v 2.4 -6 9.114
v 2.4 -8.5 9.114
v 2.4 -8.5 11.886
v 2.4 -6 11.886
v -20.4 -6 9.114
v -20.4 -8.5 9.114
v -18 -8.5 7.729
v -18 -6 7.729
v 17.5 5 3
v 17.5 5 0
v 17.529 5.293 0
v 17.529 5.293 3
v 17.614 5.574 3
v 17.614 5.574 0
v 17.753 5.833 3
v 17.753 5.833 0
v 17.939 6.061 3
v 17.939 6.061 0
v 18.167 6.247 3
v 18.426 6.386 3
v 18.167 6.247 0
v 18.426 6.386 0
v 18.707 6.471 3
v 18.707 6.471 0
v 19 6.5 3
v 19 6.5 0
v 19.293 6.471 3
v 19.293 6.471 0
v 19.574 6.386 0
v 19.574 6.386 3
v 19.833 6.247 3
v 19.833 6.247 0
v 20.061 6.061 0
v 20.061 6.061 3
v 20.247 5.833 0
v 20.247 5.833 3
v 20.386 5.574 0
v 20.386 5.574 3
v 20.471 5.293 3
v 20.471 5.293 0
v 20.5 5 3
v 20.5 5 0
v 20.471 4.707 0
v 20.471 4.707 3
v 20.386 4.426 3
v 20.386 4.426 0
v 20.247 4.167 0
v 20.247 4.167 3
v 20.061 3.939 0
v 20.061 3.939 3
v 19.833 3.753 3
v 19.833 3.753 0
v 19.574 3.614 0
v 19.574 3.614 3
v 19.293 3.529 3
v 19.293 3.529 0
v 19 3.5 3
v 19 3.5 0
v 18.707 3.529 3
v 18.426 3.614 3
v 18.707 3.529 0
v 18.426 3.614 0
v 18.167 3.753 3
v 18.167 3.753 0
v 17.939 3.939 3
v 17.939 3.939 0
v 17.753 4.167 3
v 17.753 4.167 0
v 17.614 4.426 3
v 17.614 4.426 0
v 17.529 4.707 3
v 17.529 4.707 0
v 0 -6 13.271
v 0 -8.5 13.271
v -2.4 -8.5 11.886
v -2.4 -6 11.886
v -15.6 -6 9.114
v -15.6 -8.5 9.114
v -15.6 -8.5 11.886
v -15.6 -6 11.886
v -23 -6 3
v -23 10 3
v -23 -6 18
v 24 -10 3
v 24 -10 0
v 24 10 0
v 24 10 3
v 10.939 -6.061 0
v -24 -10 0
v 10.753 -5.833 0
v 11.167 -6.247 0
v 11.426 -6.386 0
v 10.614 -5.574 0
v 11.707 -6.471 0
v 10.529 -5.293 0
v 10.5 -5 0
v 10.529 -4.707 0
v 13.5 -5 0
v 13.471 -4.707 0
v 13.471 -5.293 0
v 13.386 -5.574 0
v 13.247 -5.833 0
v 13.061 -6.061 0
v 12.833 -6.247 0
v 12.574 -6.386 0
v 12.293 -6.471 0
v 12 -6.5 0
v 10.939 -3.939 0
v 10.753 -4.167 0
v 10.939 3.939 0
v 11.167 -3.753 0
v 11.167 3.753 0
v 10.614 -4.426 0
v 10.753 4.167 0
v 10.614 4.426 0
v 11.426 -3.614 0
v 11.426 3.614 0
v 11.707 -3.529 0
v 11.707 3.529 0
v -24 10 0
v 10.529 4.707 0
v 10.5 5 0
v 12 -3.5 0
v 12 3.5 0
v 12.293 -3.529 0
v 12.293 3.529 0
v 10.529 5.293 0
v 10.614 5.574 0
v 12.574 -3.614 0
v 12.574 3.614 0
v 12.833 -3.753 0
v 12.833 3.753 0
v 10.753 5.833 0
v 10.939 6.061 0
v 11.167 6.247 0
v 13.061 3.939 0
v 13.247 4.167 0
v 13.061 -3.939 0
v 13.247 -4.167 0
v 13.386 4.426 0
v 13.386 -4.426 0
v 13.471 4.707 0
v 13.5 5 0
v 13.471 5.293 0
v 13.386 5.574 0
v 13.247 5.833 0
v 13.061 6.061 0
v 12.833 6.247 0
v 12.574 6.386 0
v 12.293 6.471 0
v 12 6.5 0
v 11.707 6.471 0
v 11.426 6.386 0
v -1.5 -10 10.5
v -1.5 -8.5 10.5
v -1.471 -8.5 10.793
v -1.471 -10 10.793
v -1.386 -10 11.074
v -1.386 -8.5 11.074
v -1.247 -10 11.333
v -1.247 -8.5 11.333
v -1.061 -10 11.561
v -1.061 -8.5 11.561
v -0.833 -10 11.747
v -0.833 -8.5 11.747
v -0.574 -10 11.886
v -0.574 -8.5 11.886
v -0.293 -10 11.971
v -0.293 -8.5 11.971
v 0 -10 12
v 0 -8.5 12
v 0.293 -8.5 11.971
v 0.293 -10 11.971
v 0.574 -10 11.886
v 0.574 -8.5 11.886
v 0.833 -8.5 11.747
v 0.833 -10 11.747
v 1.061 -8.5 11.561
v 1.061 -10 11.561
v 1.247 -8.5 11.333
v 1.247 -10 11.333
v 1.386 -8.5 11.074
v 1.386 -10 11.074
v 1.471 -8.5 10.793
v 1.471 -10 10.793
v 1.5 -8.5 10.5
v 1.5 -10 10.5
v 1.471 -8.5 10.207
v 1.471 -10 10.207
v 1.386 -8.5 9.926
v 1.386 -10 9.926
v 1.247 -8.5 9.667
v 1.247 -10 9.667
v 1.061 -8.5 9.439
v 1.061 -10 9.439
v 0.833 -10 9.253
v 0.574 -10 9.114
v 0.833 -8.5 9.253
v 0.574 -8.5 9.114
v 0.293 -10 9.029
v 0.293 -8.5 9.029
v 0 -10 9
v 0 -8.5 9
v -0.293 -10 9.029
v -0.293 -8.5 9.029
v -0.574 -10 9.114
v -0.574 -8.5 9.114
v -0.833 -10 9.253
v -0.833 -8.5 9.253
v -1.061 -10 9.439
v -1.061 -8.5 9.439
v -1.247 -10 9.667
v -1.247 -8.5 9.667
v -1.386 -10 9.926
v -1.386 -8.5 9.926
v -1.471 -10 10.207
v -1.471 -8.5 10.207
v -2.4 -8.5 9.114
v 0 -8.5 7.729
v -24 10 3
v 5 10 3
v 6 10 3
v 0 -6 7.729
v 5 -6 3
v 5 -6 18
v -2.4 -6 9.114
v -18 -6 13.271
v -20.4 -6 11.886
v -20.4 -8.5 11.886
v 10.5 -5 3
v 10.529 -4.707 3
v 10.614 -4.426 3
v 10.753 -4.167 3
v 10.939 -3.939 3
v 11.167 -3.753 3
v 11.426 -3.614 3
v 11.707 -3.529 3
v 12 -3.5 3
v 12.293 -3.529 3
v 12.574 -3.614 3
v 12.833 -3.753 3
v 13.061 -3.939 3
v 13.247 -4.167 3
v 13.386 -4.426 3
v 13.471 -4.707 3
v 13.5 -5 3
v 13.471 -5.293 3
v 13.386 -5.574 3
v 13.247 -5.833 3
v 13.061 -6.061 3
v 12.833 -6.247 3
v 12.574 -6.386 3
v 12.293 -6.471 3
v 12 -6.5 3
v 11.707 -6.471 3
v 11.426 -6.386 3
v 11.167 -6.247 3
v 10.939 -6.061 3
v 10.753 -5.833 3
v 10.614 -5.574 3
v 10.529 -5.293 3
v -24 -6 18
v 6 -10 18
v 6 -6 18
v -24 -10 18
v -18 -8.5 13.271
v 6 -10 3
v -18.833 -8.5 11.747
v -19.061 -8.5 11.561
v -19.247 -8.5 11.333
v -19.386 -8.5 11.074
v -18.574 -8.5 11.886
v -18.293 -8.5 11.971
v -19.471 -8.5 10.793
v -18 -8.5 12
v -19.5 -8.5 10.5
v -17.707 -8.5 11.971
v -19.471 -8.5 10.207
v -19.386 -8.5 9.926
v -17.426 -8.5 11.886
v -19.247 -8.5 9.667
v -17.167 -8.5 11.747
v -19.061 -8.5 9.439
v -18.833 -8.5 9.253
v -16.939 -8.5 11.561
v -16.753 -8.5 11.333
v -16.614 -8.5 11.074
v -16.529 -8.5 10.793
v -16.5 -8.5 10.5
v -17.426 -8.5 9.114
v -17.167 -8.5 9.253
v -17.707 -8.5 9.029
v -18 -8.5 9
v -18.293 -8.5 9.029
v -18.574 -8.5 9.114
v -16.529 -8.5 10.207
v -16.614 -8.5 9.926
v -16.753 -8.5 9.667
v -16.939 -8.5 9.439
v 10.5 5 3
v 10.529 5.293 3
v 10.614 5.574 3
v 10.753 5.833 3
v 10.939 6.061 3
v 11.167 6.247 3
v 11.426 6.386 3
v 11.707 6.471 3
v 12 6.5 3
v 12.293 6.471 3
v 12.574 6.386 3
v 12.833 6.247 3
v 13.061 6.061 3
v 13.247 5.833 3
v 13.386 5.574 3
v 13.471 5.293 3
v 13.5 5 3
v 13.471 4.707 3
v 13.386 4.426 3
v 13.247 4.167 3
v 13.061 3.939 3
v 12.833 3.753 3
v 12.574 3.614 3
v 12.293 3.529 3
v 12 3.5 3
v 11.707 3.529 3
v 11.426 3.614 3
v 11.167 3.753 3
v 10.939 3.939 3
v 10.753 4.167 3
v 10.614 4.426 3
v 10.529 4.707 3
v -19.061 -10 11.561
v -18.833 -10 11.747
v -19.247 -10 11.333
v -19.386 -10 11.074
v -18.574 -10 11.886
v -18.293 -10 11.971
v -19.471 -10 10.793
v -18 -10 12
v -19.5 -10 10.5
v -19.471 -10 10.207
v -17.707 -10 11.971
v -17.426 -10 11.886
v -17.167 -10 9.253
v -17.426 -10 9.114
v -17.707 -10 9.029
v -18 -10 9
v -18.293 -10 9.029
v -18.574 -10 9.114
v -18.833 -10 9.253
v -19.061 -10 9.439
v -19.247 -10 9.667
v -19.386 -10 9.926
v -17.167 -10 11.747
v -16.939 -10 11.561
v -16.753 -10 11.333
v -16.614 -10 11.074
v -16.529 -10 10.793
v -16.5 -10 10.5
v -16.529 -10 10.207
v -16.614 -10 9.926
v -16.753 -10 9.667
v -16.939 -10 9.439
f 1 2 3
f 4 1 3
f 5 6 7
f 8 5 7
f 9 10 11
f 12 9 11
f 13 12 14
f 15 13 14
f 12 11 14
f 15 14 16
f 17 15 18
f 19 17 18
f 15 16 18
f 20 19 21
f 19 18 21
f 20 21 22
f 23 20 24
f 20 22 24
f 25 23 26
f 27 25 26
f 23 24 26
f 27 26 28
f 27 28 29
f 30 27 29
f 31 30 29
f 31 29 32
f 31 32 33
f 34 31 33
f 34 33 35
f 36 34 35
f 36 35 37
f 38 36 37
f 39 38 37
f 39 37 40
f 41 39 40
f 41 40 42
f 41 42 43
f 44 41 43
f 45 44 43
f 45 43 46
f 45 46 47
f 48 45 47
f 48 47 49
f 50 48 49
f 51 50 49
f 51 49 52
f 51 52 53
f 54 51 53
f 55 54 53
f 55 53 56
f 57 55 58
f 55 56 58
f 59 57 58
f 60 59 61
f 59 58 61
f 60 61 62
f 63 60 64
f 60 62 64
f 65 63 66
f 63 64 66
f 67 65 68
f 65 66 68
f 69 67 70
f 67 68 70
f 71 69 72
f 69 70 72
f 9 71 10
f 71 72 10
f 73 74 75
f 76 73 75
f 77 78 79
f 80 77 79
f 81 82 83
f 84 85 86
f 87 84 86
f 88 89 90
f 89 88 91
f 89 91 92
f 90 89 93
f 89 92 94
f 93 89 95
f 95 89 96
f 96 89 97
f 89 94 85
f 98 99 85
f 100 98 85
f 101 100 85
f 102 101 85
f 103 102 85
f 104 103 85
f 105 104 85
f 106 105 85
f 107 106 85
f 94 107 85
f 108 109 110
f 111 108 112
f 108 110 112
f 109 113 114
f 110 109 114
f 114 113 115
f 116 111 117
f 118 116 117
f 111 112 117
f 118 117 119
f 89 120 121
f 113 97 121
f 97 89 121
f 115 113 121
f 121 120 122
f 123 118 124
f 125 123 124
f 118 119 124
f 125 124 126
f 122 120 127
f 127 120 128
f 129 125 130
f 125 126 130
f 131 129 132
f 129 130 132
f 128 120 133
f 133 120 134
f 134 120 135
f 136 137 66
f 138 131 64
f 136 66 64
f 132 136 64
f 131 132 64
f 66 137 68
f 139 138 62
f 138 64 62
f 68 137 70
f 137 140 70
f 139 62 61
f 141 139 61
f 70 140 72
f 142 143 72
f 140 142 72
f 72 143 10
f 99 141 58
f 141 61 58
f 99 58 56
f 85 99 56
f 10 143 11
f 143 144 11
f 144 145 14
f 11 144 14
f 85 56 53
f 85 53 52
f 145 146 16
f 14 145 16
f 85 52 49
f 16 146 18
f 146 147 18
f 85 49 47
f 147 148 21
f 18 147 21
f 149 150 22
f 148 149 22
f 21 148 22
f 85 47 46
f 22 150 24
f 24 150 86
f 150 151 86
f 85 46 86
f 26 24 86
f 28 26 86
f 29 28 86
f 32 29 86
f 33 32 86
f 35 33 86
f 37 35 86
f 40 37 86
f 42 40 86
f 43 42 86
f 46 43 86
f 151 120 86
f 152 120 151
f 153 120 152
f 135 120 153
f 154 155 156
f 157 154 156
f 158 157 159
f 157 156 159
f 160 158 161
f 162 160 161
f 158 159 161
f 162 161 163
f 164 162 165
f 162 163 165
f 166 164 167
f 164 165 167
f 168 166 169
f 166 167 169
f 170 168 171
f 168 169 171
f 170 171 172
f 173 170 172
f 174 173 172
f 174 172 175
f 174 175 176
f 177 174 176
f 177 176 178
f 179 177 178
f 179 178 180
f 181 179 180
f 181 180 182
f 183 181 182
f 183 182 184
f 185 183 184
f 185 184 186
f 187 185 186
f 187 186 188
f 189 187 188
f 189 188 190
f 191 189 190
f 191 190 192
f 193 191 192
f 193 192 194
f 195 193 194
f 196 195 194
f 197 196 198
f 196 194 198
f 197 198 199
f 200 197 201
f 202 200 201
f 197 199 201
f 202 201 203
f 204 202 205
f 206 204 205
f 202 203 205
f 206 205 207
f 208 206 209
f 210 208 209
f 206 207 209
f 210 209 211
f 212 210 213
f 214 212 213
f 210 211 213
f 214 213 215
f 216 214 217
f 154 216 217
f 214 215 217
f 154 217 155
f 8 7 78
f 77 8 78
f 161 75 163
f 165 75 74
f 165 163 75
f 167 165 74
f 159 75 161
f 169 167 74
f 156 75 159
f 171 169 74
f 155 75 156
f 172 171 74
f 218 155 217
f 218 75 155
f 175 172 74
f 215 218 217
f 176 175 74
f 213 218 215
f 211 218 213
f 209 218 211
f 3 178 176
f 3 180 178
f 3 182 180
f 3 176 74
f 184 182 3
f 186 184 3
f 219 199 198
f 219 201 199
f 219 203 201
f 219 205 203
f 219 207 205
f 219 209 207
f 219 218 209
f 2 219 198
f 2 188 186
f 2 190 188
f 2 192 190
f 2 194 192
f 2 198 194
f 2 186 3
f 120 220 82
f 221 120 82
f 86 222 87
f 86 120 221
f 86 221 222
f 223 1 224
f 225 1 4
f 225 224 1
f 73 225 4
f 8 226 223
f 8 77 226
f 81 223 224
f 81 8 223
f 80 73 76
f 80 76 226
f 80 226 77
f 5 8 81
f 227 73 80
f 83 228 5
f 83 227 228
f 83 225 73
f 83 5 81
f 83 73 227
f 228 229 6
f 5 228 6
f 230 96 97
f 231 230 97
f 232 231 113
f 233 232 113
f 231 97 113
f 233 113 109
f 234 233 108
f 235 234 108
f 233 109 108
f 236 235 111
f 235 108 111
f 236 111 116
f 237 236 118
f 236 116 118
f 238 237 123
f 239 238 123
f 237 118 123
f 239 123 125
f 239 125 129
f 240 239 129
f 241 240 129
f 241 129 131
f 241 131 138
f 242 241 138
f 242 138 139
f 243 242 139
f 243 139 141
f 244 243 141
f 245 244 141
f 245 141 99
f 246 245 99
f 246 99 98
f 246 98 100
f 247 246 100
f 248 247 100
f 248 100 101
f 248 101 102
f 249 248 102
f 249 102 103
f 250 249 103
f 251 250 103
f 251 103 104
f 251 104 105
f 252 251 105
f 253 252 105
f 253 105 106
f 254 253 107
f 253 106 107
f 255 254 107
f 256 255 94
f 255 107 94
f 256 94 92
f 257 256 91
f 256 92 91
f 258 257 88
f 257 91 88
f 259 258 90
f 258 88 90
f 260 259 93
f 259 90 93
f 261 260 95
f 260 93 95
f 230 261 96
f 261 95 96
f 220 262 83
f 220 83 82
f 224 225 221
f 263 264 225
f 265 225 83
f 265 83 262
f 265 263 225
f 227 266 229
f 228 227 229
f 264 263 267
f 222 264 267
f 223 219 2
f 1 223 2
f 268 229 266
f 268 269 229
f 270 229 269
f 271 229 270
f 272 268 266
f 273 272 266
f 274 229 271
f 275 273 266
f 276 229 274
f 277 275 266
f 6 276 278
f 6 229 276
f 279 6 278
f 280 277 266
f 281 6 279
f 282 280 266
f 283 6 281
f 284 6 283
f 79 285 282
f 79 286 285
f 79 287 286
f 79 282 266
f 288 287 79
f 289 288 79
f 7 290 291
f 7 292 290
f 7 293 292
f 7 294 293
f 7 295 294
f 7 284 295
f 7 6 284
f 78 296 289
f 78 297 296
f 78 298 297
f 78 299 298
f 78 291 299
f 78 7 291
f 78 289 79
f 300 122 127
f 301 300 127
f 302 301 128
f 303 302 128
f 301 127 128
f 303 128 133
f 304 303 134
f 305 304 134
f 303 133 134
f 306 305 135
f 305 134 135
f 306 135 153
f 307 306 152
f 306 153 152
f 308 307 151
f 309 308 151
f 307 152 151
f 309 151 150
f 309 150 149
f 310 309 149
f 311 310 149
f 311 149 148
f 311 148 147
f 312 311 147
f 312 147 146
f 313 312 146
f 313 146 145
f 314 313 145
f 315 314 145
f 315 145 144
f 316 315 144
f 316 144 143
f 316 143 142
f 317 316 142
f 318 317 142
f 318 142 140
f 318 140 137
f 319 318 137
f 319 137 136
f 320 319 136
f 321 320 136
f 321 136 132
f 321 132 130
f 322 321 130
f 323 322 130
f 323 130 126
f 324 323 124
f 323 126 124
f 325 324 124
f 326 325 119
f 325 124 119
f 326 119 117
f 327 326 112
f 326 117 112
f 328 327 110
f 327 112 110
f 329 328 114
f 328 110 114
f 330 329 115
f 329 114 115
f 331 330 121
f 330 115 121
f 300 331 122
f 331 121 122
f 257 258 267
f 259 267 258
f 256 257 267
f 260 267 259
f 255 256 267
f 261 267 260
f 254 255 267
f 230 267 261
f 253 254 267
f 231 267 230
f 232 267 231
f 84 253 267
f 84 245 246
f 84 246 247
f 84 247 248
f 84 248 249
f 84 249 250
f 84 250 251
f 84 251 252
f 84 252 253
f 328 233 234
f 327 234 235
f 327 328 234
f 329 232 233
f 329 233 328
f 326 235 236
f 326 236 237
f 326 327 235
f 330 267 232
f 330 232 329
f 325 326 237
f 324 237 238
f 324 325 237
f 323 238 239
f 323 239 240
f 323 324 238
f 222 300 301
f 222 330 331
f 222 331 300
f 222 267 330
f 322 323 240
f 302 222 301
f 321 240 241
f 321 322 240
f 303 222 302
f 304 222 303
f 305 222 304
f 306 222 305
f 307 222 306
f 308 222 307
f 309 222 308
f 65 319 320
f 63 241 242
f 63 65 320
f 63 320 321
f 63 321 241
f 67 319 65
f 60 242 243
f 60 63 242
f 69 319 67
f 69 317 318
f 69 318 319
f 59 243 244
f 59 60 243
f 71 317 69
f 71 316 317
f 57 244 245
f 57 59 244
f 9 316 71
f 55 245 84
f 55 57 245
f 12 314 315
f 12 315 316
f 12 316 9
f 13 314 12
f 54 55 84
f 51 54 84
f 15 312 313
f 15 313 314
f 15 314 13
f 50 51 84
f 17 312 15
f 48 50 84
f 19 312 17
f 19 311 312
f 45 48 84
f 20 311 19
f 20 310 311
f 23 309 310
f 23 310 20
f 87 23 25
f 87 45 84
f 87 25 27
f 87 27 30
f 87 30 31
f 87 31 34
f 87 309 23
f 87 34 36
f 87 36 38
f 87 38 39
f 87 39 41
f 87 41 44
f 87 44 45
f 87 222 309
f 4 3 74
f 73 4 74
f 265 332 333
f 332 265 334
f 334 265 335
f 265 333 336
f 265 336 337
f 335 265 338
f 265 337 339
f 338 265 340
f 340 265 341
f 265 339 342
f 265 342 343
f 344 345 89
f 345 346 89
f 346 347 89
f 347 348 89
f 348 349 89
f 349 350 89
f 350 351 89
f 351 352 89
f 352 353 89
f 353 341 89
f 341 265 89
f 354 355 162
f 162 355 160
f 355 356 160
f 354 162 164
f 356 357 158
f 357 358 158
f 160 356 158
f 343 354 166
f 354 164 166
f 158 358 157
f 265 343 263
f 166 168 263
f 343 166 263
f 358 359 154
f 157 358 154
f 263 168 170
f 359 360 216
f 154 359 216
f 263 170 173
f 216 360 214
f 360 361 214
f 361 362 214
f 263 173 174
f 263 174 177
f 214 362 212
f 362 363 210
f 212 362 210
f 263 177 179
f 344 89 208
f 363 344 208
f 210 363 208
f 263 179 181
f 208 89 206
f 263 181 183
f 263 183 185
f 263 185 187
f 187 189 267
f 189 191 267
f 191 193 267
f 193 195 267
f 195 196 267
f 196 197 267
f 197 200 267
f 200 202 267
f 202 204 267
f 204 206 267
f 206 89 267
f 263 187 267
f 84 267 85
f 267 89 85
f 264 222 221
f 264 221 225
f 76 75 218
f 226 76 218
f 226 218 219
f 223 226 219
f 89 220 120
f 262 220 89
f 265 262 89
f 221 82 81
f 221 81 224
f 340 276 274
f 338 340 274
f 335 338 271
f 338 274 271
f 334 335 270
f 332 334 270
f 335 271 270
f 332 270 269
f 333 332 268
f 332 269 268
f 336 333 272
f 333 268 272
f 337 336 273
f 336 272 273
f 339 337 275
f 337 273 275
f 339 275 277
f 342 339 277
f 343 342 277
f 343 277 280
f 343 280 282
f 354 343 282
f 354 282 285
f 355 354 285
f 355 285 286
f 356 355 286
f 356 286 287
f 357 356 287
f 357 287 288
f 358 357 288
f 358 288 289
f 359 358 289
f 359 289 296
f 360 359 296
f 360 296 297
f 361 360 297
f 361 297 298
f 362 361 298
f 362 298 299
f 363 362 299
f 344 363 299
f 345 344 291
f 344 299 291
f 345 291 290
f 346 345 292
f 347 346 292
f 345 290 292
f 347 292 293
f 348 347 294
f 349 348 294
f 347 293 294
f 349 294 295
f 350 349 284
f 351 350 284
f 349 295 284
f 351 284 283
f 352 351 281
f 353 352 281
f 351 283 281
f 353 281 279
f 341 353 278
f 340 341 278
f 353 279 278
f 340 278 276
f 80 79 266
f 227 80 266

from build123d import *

# Parameters (mm, degrees)
F0_W       = 48
F0_H       = 20
F1_DEPTH   = 3
F2_W       = 30
F2_H       = 1.5
F3_DEPTH   = 15
F6_D       = 3
F6_ON_F5_D = 3
F7_W       = 30
F7_H       = 15
F8_DEPTH   = 2.5
F11_DEPTH  = 1
F12_DEPTH  = 1


with BuildPart() as f1:
    # F0 (on Top) → F1 (new body)
    with BuildSketch(Plane.XY):
        Rectangle(F0_W, F0_H)
    extrude(amount=F1_DEPTH)

    # F2 (on face) → F3 (join)
    with BuildSketch(Plane.XY.offset(3)):
        with Locations((-9, -9.25)):
            Rectangle(F2_W, F2_H)
    extrude(amount=F3_DEPTH)

    # F6 (through all)
    with Locations(Plane.XZ.offset(10)):
        with Locations((0, 10.5), (-18, 10.5)):
            Hole(F6_D / 2)

    # F6 on F5 (through all)
    with Locations(Plane.XY.offset(3)):
        with Locations((19, 5), (12, 5), (12, -5)):
            Hole(F6_ON_F5_D / 2)

    # F7 (on face) → F8 (join)
    with BuildSketch(Plane(origin=(0, -8.5, 0), x_dir=(-1, 0, 0), z_dir=(0, 1, 0))):
        with Locations((9, 10.5)):
            Rectangle(F7_W, F7_H)
        Polygon((2.4, 11.8856406461), (2.4, 9.1143593539), (0, 7.7287187079), (-2.4, 9.1143593539), (-2.4, 11.8856406461), (0, 13.2712812921), align=None, mode=Mode.SUBTRACT)
        Polygon((20.4, 9.1143593539), (18, 7.7287187079), (15.6, 9.1143593539), (15.6, 11.8856406461), (18, 13.2712812921), (20.4, 11.8856406461), align=None, mode=Mode.SUBTRACT)
    extrude(amount=F8_DEPTH)

    # F9 (on face) → F11 (join)
    with BuildSketch(Plane(origin=(-24, 0, 0), x_dir=(0, -1, 0), z_dir=(-1, 0, 0))):
        Polygon((6, 18), (-10, 3), (6, 3), align=None)
    extrude(amount=-F11_DEPTH)

    # F10 (on face) → F12 (join)
    with BuildSketch(Plane.YZ.offset(6)):
        Polygon((10, 3), (-6, 18), (-6, 3), align=None)
    extrude(amount=-F12_DEPTH)


solid = f1.part
